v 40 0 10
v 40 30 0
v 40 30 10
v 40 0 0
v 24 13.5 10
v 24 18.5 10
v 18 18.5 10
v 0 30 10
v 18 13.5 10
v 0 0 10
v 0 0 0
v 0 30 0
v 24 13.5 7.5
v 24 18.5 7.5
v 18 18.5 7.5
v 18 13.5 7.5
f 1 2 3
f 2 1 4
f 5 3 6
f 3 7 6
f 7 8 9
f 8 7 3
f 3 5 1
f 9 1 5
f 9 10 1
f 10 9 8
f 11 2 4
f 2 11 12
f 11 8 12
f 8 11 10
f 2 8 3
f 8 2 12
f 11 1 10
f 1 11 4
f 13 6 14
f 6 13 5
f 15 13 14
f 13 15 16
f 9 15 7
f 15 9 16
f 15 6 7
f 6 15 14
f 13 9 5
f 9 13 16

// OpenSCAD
// units=mm — generated by scad_emitter.py
// part=unnamed
$fn = 48;

difference() { cube([40, 30, 10]); translate([18, 13.5, 7.5]) cube([6, 5, 3]); }
